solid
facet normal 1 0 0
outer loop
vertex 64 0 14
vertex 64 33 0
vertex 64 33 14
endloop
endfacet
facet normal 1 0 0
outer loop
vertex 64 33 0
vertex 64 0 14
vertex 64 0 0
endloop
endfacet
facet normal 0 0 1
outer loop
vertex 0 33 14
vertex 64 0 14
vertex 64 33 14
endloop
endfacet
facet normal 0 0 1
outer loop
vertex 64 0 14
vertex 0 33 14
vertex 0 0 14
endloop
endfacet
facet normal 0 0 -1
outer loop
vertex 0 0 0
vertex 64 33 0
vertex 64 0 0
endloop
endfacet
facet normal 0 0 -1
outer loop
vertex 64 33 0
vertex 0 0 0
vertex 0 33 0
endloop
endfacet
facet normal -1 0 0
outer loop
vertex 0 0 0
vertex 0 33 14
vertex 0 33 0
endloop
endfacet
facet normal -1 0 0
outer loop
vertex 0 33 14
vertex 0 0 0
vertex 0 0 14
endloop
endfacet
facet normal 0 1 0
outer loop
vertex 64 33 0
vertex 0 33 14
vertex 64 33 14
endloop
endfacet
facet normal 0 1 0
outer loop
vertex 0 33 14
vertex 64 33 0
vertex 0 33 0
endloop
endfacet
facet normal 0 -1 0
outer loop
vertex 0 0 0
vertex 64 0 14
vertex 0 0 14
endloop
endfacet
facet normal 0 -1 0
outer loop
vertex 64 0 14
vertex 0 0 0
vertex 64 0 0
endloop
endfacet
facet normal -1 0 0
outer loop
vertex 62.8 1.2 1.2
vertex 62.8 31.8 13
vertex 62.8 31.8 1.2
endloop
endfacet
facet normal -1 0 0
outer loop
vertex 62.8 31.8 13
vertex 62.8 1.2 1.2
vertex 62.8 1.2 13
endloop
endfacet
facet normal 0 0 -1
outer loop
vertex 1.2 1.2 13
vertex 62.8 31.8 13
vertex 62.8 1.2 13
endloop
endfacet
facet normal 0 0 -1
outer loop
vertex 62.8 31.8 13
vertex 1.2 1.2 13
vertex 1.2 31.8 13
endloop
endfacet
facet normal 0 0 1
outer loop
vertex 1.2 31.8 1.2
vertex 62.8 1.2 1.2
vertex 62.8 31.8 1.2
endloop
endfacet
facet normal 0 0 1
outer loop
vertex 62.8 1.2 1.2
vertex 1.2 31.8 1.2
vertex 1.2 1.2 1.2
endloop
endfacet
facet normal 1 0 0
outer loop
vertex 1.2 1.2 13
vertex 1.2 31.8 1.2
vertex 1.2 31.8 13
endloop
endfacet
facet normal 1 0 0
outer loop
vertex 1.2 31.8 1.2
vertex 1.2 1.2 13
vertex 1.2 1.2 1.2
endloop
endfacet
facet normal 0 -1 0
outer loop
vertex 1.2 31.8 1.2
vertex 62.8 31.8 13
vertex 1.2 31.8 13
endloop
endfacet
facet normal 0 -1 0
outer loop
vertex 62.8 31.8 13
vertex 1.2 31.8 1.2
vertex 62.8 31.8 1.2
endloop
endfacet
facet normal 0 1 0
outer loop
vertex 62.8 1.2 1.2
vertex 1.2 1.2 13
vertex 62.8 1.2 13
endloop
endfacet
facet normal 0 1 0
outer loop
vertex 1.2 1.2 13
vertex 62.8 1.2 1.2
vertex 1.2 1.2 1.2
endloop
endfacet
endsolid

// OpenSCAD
// The pin's case (docs/enclosure.md), for OpenSCAD 2021.01 (docs/adr/0016-*.md).
// Every dimension is a variable here, in mm. The values are the paper estimates of
// docs/enclosure.md and ADR-0013: nothing has been measured. Today the model is the envelope
// only, a closed shell: the window, buttons, battery pocket and magnets come with the parts.

case_length = 64;     // along the panel's long side
case_width = 33;
case_thickness = 14;
side_wall = 1.2;
front_wall = 1.0;
back_wall = 1.2;

difference() {
    cube([case_length, case_width, case_thickness]);
    translate([side_wall, side_wall, back_wall])
        cube([case_length - 2 * side_wall, case_width - 2 * side_wall,
              case_thickness - back_wall - front_wall]);
}
